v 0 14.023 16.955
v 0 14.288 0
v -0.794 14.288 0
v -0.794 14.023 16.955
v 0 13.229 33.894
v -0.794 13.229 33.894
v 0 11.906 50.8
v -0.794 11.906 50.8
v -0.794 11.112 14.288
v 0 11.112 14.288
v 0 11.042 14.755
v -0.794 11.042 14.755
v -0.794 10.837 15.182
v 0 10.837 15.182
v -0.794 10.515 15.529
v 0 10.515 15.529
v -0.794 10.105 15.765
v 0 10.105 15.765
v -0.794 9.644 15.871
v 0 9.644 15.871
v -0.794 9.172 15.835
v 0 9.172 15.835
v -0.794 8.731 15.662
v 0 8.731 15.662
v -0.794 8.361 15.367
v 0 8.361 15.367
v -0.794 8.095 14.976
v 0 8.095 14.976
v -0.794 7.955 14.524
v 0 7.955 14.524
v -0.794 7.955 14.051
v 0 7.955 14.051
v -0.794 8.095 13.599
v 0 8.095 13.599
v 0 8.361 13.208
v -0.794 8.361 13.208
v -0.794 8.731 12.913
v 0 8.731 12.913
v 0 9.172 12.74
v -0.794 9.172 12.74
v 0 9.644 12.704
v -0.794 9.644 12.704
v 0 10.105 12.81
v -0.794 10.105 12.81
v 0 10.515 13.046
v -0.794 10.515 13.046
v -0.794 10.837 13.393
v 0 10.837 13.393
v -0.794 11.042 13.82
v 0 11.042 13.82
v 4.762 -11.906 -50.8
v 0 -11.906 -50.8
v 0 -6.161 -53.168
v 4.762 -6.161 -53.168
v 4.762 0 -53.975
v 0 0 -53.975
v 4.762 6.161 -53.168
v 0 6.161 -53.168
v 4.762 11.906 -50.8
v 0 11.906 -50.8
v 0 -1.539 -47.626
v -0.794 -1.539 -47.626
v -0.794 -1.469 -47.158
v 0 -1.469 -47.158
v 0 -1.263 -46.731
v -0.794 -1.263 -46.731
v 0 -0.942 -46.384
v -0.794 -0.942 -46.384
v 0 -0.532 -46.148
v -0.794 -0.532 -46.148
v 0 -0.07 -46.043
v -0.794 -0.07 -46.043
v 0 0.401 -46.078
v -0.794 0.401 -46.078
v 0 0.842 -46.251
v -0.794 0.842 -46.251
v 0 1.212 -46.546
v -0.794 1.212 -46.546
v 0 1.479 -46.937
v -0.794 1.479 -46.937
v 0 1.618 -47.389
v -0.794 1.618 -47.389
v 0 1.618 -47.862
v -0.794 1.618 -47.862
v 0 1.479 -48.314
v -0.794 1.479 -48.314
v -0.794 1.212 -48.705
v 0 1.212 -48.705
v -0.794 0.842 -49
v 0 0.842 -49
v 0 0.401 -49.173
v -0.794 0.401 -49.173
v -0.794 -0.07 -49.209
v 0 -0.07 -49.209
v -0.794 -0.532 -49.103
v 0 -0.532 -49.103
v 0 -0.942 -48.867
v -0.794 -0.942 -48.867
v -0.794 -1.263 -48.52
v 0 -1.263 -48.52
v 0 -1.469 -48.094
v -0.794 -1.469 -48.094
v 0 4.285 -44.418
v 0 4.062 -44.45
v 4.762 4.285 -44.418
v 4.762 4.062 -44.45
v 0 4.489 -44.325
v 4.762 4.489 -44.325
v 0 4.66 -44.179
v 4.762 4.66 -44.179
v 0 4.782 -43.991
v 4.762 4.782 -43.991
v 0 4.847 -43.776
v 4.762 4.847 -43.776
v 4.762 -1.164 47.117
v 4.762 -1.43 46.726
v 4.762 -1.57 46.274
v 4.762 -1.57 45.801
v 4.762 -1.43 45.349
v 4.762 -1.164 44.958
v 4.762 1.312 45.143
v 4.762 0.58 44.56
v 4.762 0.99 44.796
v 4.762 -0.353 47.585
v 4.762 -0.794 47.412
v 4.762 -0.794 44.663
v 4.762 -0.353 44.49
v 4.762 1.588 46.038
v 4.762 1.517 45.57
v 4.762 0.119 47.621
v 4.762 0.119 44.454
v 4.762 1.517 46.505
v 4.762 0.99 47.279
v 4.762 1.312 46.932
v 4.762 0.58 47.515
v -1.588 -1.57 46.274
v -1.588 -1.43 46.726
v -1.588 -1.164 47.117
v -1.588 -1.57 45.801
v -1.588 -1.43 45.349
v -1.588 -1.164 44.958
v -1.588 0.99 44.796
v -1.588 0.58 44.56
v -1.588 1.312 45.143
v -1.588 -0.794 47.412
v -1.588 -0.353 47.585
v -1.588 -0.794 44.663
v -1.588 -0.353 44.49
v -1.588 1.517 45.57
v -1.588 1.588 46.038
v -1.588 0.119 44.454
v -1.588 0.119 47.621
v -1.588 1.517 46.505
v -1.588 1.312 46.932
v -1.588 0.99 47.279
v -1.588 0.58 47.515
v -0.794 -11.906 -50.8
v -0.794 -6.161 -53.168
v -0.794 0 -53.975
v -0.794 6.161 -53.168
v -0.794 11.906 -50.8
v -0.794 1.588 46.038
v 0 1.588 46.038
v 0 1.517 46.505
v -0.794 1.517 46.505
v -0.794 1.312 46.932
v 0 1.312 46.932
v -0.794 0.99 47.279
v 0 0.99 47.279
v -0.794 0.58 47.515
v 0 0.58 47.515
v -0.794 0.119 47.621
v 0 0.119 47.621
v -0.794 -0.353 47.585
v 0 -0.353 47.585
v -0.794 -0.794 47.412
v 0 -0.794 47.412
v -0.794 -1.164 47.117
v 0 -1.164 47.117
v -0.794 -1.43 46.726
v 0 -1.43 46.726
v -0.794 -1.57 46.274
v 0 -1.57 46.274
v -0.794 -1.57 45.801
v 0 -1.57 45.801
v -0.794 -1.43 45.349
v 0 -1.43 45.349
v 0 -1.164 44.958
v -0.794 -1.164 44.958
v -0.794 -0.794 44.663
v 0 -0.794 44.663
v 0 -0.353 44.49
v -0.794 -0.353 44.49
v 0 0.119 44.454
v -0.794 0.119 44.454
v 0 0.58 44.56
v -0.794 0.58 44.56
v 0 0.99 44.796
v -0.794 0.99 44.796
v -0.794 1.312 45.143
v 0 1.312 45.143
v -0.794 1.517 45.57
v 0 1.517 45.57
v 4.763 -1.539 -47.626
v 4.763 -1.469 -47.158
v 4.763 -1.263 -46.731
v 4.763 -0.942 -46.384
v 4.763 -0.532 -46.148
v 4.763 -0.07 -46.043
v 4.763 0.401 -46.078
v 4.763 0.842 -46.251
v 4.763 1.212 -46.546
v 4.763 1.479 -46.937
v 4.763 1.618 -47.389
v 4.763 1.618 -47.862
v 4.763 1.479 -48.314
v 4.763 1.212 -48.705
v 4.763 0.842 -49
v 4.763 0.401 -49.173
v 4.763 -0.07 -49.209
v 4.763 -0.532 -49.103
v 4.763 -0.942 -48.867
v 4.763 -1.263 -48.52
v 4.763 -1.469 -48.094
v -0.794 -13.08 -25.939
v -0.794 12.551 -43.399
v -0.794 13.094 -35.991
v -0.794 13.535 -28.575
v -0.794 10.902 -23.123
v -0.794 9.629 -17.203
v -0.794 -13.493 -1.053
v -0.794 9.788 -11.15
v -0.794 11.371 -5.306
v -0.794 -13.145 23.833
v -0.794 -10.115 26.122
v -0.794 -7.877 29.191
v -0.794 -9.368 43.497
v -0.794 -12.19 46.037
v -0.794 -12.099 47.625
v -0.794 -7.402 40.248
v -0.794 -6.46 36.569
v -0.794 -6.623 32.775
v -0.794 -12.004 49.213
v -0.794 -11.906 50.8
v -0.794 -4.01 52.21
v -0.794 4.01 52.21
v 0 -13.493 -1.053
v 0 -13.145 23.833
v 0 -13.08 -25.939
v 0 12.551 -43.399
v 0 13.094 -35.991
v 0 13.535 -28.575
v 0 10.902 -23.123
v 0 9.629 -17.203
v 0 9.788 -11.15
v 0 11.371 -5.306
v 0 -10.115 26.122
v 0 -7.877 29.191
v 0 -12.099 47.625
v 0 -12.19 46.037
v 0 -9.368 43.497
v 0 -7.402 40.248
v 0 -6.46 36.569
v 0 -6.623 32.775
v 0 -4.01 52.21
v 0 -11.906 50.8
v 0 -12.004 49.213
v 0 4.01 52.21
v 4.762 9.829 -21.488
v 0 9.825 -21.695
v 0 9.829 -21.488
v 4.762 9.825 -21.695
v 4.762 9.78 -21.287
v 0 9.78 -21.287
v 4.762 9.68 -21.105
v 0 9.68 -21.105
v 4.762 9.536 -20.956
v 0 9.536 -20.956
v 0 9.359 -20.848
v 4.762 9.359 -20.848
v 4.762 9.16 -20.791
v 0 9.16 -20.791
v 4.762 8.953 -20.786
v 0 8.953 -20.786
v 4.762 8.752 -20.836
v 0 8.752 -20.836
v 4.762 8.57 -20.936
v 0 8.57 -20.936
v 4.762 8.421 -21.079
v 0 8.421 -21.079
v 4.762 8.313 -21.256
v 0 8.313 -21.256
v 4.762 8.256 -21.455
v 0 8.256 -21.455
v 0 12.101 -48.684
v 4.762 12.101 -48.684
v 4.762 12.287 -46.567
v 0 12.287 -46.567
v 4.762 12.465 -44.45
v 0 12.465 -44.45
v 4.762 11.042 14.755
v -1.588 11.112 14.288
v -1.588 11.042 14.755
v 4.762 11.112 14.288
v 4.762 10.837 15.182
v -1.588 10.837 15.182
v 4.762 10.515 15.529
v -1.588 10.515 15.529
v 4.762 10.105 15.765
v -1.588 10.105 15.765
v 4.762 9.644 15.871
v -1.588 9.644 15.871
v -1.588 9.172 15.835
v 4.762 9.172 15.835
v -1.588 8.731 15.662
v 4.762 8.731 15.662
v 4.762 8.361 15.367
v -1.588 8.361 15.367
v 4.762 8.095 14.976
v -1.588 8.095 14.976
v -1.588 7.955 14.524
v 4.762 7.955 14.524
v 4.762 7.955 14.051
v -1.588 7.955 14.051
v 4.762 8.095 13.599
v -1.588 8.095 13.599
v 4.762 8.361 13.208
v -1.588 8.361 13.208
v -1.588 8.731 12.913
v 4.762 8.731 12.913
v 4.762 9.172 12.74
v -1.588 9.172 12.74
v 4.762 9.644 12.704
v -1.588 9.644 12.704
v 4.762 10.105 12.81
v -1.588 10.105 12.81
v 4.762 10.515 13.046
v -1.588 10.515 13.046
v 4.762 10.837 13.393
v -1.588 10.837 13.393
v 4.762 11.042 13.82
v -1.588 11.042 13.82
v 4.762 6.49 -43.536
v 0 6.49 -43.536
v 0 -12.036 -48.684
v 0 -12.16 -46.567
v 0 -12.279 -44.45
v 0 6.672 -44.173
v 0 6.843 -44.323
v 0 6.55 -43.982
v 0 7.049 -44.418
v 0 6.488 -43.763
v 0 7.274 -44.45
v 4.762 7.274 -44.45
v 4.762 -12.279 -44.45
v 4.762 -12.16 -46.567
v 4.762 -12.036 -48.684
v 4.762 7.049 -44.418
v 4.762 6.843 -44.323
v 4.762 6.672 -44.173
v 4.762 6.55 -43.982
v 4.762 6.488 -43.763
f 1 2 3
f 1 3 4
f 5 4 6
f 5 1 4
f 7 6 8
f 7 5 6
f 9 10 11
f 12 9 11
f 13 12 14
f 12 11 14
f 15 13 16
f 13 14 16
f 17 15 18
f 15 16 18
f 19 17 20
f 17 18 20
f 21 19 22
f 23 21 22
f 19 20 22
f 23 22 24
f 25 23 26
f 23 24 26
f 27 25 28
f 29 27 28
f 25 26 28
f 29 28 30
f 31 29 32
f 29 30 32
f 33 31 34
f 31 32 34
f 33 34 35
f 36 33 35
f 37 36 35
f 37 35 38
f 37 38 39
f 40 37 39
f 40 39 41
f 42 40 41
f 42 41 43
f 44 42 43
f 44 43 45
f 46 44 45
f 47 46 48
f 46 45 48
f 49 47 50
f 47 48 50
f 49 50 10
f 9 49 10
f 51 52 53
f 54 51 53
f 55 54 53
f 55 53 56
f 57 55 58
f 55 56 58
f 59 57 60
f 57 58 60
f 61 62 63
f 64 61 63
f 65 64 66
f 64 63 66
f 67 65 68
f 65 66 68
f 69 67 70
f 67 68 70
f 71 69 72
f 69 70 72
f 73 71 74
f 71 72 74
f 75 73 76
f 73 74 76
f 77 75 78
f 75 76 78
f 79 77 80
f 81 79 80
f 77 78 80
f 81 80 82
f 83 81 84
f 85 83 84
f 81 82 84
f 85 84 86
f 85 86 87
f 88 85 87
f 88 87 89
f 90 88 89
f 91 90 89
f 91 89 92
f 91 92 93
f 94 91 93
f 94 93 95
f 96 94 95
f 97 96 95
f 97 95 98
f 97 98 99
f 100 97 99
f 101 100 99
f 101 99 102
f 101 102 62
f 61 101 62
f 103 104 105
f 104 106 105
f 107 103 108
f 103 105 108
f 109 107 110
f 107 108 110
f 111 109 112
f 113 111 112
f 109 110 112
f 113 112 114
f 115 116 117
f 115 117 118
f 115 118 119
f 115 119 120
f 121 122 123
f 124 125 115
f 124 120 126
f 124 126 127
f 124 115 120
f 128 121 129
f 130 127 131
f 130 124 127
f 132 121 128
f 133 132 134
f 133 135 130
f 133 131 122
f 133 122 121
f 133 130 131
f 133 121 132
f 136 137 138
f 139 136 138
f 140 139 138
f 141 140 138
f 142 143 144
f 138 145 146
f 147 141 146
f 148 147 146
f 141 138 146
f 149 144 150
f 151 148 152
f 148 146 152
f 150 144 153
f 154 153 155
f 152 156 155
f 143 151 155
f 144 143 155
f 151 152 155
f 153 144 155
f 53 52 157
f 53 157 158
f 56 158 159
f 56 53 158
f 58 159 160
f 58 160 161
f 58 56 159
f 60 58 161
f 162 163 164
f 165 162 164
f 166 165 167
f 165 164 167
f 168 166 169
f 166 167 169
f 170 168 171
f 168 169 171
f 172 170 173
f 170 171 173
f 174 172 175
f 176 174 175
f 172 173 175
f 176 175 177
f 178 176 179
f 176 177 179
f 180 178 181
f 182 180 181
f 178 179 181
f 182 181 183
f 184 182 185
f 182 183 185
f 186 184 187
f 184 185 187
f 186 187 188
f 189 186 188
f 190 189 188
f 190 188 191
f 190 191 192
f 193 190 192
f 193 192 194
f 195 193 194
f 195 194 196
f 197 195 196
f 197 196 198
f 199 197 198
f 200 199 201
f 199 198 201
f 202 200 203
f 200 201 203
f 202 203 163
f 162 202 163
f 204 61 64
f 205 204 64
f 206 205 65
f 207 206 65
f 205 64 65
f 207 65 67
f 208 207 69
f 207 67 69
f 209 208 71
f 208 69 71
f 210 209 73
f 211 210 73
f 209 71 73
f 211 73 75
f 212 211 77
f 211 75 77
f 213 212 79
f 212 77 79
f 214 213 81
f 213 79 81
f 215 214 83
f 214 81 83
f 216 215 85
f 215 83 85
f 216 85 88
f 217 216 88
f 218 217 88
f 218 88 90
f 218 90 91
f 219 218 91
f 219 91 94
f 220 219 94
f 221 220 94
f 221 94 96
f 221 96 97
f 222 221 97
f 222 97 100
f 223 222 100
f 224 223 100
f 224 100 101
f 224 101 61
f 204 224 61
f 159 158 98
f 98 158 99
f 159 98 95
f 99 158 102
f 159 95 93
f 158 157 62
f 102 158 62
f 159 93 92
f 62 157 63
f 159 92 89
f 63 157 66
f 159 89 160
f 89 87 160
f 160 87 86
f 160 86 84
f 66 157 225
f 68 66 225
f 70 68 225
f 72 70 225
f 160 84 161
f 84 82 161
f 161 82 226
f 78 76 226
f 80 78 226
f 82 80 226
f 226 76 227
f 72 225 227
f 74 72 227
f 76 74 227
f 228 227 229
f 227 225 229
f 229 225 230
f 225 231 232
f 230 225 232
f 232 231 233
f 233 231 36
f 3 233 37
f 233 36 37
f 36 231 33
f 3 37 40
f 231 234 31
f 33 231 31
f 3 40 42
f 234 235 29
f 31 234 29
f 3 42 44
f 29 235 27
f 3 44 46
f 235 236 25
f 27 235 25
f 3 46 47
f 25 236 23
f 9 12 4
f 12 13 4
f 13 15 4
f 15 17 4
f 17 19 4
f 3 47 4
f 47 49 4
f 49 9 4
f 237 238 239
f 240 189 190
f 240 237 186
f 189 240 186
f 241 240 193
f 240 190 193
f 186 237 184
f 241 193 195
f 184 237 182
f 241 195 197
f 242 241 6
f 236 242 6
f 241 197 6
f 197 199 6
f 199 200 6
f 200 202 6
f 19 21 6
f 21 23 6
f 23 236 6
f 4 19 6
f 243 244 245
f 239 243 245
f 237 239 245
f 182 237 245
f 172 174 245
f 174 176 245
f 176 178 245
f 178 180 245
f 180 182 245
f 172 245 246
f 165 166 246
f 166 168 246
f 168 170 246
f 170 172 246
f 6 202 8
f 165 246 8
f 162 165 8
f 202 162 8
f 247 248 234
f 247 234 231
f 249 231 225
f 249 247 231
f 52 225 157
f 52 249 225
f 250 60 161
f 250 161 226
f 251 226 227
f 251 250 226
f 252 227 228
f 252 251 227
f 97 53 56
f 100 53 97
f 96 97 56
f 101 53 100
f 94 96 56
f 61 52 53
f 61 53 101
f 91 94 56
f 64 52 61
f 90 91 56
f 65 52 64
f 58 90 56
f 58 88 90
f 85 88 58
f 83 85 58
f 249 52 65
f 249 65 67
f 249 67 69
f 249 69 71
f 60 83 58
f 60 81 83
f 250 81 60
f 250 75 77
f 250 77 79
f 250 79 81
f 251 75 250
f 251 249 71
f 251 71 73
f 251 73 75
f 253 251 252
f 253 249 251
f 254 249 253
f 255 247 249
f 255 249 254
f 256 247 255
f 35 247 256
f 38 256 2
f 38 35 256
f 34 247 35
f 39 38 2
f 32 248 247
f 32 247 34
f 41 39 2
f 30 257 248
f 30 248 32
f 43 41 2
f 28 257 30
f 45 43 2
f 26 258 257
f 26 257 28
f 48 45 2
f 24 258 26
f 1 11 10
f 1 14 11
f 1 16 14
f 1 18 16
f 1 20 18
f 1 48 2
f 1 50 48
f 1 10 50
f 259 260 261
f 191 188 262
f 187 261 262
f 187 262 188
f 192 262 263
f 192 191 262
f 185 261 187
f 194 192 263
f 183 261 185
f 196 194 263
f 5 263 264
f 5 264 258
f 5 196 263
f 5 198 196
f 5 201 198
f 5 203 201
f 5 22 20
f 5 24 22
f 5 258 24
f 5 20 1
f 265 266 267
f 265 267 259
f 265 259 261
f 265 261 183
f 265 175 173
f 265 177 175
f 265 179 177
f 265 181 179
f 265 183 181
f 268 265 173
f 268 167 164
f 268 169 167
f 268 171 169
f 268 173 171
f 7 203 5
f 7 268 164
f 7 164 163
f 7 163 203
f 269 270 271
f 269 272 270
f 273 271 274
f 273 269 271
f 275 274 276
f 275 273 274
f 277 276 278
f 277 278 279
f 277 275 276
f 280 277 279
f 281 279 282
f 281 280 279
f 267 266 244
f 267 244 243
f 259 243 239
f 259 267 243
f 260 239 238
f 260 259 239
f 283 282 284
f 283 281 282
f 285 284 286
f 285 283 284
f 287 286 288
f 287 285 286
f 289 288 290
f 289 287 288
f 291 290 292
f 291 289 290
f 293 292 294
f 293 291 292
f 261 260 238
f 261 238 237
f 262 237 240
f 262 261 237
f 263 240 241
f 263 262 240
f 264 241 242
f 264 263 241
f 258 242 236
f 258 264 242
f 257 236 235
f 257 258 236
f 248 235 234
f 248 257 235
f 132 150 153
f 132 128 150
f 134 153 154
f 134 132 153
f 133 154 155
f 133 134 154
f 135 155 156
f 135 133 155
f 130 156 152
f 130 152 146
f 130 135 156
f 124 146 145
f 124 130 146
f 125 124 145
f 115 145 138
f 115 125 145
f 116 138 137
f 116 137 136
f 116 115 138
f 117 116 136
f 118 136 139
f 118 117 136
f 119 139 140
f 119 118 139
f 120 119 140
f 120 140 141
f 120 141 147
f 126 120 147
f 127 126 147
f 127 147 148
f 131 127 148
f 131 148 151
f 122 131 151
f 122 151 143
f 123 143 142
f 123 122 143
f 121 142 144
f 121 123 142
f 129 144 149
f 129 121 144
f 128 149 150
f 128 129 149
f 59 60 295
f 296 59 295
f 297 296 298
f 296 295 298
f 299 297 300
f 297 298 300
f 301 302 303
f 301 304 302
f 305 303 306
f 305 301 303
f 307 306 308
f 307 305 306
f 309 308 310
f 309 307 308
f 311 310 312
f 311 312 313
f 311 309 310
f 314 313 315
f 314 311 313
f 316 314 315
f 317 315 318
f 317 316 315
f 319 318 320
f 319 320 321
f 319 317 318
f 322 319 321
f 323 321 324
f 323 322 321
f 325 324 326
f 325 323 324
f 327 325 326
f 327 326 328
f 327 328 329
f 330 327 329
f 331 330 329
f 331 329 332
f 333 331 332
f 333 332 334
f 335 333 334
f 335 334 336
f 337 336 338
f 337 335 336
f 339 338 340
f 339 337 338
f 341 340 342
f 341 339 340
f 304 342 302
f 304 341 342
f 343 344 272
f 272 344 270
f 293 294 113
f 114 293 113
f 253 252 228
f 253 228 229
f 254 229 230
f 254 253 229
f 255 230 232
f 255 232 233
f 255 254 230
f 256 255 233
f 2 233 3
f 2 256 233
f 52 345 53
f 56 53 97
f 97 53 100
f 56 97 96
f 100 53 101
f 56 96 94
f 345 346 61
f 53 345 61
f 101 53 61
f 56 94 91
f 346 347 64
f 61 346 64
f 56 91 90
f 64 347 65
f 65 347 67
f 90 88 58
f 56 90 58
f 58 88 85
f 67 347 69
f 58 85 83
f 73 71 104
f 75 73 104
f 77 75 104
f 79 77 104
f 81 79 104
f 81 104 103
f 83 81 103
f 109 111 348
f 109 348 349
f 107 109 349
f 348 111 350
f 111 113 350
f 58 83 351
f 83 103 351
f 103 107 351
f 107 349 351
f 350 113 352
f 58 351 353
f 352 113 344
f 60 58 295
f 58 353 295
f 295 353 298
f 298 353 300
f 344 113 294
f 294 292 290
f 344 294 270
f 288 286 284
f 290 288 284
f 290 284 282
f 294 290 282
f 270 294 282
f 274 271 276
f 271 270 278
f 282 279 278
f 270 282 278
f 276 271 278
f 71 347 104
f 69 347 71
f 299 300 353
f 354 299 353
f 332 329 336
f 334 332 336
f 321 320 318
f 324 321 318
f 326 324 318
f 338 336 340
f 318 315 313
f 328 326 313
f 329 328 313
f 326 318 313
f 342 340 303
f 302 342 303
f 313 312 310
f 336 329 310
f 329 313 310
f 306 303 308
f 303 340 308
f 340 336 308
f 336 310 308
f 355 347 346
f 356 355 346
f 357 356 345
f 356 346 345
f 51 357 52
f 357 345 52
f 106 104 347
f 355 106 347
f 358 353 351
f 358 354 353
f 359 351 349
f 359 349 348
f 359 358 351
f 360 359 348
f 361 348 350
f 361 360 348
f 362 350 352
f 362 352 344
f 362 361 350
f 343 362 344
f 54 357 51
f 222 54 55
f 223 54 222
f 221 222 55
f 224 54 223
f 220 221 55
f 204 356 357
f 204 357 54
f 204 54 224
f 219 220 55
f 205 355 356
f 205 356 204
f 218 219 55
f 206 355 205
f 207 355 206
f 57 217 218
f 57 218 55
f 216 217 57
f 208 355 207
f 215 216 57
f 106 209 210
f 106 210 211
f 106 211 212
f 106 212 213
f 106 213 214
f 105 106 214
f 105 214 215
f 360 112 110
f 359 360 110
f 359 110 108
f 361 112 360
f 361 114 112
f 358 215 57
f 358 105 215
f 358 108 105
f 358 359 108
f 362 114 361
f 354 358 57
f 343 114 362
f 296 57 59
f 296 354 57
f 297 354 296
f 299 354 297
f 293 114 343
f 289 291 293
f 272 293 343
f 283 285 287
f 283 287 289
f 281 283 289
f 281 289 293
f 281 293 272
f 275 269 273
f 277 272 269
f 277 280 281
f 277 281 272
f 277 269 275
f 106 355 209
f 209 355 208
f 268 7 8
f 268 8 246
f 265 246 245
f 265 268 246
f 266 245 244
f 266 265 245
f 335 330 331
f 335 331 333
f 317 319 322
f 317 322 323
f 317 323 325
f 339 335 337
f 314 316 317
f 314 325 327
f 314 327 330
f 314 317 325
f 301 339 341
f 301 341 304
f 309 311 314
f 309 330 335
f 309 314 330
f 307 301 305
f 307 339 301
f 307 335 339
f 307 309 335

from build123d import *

# Parameters (mm, degrees)
F0_R          = 1.5875
F1_DEPTH      = 0.79375
F2_DEPTH      = 4.7625
F2_DEPTH_BACK = 1.5875
F3_DEPTH      = 4.7625
F4_R          = 0.79374
F7_D          = 3.175
F7_2_D        = 3.175


# Not quite as in the source:
# - a fillet or chamfer is up to 0.001 mm smaller than in the source, because OpenCascade refuses the exact size


with BuildPart() as f1:
    # F0 (on Right) → F1 (new body)
    with BuildSketch(Plane.YZ):
        with BuildLine():
            ThreePointArc((-11.90625, -50.8), (0, -53.975), (11.90625, -50.8))
            ThreePointArc((11.90625, -50.8), (12.8347328861, -39.6958564126), (13.5351884021, -28.575))
            ThreePointArc((13.5351884021, -28.575), (9.5277768783, -14.1720911273), (14.2875, 0))
            ThreePointArc((14.2875, 0), (13.6918608439, 25.4278899614), (11.90625, 50.8))
            ThreePointArc((11.90625, 50.8), (0, 52.3875), (-11.90625, 50.8))
            ThreePointArc((-11.90625, 50.8), (-12.0517066, 48.4189581239), (-12.1901812978, 46.0375))
            ThreePointArc((-12.1901812978, 46.0375), (-6.4020679088, 34.6659483313), (-13.1445991419, 23.8330024471))
            ThreePointArc((-13.1445991419, 23.8330024471), (-13.381777253, -13.4977078204), (-11.90625, -50.8))
        make_face()
        with Locations((0, 46.0375)):
            Circle(F0_R, mode=Mode.SUBTRACT)
        with Locations((9.525, 14.2875)):
            Circle(F0_R, mode=Mode.SUBTRACT)
    extrude(amount=-F1_DEPTH)

    # F7 (through all)
    with Locations(Plane.YZ.offset(4.7625)):
        with Locations((0.0482433617, -47.6255920894)):
            Hole(F7_D / 2)


with BuildPart() as f2:
    # F0 (on Right) → F2 (new body, two sides)
    with BuildSketch(Plane.YZ) as f2_sk:
        with Locations((0, 46.0375)):
            Circle(F0_R)
    extrude(amount=F2_DEPTH)
    extrude(f2_sk.sketch, amount=-F2_DEPTH_BACK)


with BuildPart() as f2b:
    # F0 (on Right) → F2, piece 2 (new body, two sides)
    with BuildSketch(Plane.YZ) as f2_2_sk:
        with Locations((9.525, 14.2875)):
            Circle(F0_R)
    extrude(amount=F2_DEPTH)
    extrude(f2_2_sk.sketch, amount=-F2_DEPTH_BACK)


with BuildPart() as f3:
    # F6 (on face) → F3 (new body)
    with BuildSketch(Plane.YZ):
        with BuildLine():
            Line((4.744096871, -44.45), (-12.2785986466, -44.45))
            ThreePointArc((-12.2785986466, -44.45), (-12.0986301104, -47.6253638923), (-11.90625, -50.8))
            ThreePointArc((-11.90625, -50.8), (0, -53.975), (11.90625, -50.8))
            ThreePointArc((11.90625, -50.8), (12.1950900719, -47.6258202864), (12.4652954557, -44.45))
            Line((12.4652954557, -44.45), (6.35, -44.45))
            Line((6.35, -44.45), (4.744096871, -44.45))
        make_face()
        Polygon((8.3753566937, -20.6707392301), (4.744096871, -44.45), (6.35, -44.45), (9.9446644586, -20.9103835273), align=None)
    extrude(amount=F3_DEPTH)

    # F4 (radius 0.79375 in the source; OpenCascade refuses exactly that, so slightly less here)
    f4_edges = [f3.edges().sort_by_distance(p)[0] for p in [
        (2.38125, 4.744097, -44.45),
        (2.38125, 6.35, -44.45),
        (2.38125, 9.944664, -20.910384),
        (2.38125, 8.375357, -20.670739),
    ]]
    fillet(f4_edges, radius=F4_R)

    # F7#2 (through all)
    with Locations(Plane.YZ.offset(4.7625)):
        with Locations((0.0482433617, -47.6255920894)):
            Hole(F7_2_D / 2)


solid = Compound([f1.part, f2.part, f2b.part, f3.part])
